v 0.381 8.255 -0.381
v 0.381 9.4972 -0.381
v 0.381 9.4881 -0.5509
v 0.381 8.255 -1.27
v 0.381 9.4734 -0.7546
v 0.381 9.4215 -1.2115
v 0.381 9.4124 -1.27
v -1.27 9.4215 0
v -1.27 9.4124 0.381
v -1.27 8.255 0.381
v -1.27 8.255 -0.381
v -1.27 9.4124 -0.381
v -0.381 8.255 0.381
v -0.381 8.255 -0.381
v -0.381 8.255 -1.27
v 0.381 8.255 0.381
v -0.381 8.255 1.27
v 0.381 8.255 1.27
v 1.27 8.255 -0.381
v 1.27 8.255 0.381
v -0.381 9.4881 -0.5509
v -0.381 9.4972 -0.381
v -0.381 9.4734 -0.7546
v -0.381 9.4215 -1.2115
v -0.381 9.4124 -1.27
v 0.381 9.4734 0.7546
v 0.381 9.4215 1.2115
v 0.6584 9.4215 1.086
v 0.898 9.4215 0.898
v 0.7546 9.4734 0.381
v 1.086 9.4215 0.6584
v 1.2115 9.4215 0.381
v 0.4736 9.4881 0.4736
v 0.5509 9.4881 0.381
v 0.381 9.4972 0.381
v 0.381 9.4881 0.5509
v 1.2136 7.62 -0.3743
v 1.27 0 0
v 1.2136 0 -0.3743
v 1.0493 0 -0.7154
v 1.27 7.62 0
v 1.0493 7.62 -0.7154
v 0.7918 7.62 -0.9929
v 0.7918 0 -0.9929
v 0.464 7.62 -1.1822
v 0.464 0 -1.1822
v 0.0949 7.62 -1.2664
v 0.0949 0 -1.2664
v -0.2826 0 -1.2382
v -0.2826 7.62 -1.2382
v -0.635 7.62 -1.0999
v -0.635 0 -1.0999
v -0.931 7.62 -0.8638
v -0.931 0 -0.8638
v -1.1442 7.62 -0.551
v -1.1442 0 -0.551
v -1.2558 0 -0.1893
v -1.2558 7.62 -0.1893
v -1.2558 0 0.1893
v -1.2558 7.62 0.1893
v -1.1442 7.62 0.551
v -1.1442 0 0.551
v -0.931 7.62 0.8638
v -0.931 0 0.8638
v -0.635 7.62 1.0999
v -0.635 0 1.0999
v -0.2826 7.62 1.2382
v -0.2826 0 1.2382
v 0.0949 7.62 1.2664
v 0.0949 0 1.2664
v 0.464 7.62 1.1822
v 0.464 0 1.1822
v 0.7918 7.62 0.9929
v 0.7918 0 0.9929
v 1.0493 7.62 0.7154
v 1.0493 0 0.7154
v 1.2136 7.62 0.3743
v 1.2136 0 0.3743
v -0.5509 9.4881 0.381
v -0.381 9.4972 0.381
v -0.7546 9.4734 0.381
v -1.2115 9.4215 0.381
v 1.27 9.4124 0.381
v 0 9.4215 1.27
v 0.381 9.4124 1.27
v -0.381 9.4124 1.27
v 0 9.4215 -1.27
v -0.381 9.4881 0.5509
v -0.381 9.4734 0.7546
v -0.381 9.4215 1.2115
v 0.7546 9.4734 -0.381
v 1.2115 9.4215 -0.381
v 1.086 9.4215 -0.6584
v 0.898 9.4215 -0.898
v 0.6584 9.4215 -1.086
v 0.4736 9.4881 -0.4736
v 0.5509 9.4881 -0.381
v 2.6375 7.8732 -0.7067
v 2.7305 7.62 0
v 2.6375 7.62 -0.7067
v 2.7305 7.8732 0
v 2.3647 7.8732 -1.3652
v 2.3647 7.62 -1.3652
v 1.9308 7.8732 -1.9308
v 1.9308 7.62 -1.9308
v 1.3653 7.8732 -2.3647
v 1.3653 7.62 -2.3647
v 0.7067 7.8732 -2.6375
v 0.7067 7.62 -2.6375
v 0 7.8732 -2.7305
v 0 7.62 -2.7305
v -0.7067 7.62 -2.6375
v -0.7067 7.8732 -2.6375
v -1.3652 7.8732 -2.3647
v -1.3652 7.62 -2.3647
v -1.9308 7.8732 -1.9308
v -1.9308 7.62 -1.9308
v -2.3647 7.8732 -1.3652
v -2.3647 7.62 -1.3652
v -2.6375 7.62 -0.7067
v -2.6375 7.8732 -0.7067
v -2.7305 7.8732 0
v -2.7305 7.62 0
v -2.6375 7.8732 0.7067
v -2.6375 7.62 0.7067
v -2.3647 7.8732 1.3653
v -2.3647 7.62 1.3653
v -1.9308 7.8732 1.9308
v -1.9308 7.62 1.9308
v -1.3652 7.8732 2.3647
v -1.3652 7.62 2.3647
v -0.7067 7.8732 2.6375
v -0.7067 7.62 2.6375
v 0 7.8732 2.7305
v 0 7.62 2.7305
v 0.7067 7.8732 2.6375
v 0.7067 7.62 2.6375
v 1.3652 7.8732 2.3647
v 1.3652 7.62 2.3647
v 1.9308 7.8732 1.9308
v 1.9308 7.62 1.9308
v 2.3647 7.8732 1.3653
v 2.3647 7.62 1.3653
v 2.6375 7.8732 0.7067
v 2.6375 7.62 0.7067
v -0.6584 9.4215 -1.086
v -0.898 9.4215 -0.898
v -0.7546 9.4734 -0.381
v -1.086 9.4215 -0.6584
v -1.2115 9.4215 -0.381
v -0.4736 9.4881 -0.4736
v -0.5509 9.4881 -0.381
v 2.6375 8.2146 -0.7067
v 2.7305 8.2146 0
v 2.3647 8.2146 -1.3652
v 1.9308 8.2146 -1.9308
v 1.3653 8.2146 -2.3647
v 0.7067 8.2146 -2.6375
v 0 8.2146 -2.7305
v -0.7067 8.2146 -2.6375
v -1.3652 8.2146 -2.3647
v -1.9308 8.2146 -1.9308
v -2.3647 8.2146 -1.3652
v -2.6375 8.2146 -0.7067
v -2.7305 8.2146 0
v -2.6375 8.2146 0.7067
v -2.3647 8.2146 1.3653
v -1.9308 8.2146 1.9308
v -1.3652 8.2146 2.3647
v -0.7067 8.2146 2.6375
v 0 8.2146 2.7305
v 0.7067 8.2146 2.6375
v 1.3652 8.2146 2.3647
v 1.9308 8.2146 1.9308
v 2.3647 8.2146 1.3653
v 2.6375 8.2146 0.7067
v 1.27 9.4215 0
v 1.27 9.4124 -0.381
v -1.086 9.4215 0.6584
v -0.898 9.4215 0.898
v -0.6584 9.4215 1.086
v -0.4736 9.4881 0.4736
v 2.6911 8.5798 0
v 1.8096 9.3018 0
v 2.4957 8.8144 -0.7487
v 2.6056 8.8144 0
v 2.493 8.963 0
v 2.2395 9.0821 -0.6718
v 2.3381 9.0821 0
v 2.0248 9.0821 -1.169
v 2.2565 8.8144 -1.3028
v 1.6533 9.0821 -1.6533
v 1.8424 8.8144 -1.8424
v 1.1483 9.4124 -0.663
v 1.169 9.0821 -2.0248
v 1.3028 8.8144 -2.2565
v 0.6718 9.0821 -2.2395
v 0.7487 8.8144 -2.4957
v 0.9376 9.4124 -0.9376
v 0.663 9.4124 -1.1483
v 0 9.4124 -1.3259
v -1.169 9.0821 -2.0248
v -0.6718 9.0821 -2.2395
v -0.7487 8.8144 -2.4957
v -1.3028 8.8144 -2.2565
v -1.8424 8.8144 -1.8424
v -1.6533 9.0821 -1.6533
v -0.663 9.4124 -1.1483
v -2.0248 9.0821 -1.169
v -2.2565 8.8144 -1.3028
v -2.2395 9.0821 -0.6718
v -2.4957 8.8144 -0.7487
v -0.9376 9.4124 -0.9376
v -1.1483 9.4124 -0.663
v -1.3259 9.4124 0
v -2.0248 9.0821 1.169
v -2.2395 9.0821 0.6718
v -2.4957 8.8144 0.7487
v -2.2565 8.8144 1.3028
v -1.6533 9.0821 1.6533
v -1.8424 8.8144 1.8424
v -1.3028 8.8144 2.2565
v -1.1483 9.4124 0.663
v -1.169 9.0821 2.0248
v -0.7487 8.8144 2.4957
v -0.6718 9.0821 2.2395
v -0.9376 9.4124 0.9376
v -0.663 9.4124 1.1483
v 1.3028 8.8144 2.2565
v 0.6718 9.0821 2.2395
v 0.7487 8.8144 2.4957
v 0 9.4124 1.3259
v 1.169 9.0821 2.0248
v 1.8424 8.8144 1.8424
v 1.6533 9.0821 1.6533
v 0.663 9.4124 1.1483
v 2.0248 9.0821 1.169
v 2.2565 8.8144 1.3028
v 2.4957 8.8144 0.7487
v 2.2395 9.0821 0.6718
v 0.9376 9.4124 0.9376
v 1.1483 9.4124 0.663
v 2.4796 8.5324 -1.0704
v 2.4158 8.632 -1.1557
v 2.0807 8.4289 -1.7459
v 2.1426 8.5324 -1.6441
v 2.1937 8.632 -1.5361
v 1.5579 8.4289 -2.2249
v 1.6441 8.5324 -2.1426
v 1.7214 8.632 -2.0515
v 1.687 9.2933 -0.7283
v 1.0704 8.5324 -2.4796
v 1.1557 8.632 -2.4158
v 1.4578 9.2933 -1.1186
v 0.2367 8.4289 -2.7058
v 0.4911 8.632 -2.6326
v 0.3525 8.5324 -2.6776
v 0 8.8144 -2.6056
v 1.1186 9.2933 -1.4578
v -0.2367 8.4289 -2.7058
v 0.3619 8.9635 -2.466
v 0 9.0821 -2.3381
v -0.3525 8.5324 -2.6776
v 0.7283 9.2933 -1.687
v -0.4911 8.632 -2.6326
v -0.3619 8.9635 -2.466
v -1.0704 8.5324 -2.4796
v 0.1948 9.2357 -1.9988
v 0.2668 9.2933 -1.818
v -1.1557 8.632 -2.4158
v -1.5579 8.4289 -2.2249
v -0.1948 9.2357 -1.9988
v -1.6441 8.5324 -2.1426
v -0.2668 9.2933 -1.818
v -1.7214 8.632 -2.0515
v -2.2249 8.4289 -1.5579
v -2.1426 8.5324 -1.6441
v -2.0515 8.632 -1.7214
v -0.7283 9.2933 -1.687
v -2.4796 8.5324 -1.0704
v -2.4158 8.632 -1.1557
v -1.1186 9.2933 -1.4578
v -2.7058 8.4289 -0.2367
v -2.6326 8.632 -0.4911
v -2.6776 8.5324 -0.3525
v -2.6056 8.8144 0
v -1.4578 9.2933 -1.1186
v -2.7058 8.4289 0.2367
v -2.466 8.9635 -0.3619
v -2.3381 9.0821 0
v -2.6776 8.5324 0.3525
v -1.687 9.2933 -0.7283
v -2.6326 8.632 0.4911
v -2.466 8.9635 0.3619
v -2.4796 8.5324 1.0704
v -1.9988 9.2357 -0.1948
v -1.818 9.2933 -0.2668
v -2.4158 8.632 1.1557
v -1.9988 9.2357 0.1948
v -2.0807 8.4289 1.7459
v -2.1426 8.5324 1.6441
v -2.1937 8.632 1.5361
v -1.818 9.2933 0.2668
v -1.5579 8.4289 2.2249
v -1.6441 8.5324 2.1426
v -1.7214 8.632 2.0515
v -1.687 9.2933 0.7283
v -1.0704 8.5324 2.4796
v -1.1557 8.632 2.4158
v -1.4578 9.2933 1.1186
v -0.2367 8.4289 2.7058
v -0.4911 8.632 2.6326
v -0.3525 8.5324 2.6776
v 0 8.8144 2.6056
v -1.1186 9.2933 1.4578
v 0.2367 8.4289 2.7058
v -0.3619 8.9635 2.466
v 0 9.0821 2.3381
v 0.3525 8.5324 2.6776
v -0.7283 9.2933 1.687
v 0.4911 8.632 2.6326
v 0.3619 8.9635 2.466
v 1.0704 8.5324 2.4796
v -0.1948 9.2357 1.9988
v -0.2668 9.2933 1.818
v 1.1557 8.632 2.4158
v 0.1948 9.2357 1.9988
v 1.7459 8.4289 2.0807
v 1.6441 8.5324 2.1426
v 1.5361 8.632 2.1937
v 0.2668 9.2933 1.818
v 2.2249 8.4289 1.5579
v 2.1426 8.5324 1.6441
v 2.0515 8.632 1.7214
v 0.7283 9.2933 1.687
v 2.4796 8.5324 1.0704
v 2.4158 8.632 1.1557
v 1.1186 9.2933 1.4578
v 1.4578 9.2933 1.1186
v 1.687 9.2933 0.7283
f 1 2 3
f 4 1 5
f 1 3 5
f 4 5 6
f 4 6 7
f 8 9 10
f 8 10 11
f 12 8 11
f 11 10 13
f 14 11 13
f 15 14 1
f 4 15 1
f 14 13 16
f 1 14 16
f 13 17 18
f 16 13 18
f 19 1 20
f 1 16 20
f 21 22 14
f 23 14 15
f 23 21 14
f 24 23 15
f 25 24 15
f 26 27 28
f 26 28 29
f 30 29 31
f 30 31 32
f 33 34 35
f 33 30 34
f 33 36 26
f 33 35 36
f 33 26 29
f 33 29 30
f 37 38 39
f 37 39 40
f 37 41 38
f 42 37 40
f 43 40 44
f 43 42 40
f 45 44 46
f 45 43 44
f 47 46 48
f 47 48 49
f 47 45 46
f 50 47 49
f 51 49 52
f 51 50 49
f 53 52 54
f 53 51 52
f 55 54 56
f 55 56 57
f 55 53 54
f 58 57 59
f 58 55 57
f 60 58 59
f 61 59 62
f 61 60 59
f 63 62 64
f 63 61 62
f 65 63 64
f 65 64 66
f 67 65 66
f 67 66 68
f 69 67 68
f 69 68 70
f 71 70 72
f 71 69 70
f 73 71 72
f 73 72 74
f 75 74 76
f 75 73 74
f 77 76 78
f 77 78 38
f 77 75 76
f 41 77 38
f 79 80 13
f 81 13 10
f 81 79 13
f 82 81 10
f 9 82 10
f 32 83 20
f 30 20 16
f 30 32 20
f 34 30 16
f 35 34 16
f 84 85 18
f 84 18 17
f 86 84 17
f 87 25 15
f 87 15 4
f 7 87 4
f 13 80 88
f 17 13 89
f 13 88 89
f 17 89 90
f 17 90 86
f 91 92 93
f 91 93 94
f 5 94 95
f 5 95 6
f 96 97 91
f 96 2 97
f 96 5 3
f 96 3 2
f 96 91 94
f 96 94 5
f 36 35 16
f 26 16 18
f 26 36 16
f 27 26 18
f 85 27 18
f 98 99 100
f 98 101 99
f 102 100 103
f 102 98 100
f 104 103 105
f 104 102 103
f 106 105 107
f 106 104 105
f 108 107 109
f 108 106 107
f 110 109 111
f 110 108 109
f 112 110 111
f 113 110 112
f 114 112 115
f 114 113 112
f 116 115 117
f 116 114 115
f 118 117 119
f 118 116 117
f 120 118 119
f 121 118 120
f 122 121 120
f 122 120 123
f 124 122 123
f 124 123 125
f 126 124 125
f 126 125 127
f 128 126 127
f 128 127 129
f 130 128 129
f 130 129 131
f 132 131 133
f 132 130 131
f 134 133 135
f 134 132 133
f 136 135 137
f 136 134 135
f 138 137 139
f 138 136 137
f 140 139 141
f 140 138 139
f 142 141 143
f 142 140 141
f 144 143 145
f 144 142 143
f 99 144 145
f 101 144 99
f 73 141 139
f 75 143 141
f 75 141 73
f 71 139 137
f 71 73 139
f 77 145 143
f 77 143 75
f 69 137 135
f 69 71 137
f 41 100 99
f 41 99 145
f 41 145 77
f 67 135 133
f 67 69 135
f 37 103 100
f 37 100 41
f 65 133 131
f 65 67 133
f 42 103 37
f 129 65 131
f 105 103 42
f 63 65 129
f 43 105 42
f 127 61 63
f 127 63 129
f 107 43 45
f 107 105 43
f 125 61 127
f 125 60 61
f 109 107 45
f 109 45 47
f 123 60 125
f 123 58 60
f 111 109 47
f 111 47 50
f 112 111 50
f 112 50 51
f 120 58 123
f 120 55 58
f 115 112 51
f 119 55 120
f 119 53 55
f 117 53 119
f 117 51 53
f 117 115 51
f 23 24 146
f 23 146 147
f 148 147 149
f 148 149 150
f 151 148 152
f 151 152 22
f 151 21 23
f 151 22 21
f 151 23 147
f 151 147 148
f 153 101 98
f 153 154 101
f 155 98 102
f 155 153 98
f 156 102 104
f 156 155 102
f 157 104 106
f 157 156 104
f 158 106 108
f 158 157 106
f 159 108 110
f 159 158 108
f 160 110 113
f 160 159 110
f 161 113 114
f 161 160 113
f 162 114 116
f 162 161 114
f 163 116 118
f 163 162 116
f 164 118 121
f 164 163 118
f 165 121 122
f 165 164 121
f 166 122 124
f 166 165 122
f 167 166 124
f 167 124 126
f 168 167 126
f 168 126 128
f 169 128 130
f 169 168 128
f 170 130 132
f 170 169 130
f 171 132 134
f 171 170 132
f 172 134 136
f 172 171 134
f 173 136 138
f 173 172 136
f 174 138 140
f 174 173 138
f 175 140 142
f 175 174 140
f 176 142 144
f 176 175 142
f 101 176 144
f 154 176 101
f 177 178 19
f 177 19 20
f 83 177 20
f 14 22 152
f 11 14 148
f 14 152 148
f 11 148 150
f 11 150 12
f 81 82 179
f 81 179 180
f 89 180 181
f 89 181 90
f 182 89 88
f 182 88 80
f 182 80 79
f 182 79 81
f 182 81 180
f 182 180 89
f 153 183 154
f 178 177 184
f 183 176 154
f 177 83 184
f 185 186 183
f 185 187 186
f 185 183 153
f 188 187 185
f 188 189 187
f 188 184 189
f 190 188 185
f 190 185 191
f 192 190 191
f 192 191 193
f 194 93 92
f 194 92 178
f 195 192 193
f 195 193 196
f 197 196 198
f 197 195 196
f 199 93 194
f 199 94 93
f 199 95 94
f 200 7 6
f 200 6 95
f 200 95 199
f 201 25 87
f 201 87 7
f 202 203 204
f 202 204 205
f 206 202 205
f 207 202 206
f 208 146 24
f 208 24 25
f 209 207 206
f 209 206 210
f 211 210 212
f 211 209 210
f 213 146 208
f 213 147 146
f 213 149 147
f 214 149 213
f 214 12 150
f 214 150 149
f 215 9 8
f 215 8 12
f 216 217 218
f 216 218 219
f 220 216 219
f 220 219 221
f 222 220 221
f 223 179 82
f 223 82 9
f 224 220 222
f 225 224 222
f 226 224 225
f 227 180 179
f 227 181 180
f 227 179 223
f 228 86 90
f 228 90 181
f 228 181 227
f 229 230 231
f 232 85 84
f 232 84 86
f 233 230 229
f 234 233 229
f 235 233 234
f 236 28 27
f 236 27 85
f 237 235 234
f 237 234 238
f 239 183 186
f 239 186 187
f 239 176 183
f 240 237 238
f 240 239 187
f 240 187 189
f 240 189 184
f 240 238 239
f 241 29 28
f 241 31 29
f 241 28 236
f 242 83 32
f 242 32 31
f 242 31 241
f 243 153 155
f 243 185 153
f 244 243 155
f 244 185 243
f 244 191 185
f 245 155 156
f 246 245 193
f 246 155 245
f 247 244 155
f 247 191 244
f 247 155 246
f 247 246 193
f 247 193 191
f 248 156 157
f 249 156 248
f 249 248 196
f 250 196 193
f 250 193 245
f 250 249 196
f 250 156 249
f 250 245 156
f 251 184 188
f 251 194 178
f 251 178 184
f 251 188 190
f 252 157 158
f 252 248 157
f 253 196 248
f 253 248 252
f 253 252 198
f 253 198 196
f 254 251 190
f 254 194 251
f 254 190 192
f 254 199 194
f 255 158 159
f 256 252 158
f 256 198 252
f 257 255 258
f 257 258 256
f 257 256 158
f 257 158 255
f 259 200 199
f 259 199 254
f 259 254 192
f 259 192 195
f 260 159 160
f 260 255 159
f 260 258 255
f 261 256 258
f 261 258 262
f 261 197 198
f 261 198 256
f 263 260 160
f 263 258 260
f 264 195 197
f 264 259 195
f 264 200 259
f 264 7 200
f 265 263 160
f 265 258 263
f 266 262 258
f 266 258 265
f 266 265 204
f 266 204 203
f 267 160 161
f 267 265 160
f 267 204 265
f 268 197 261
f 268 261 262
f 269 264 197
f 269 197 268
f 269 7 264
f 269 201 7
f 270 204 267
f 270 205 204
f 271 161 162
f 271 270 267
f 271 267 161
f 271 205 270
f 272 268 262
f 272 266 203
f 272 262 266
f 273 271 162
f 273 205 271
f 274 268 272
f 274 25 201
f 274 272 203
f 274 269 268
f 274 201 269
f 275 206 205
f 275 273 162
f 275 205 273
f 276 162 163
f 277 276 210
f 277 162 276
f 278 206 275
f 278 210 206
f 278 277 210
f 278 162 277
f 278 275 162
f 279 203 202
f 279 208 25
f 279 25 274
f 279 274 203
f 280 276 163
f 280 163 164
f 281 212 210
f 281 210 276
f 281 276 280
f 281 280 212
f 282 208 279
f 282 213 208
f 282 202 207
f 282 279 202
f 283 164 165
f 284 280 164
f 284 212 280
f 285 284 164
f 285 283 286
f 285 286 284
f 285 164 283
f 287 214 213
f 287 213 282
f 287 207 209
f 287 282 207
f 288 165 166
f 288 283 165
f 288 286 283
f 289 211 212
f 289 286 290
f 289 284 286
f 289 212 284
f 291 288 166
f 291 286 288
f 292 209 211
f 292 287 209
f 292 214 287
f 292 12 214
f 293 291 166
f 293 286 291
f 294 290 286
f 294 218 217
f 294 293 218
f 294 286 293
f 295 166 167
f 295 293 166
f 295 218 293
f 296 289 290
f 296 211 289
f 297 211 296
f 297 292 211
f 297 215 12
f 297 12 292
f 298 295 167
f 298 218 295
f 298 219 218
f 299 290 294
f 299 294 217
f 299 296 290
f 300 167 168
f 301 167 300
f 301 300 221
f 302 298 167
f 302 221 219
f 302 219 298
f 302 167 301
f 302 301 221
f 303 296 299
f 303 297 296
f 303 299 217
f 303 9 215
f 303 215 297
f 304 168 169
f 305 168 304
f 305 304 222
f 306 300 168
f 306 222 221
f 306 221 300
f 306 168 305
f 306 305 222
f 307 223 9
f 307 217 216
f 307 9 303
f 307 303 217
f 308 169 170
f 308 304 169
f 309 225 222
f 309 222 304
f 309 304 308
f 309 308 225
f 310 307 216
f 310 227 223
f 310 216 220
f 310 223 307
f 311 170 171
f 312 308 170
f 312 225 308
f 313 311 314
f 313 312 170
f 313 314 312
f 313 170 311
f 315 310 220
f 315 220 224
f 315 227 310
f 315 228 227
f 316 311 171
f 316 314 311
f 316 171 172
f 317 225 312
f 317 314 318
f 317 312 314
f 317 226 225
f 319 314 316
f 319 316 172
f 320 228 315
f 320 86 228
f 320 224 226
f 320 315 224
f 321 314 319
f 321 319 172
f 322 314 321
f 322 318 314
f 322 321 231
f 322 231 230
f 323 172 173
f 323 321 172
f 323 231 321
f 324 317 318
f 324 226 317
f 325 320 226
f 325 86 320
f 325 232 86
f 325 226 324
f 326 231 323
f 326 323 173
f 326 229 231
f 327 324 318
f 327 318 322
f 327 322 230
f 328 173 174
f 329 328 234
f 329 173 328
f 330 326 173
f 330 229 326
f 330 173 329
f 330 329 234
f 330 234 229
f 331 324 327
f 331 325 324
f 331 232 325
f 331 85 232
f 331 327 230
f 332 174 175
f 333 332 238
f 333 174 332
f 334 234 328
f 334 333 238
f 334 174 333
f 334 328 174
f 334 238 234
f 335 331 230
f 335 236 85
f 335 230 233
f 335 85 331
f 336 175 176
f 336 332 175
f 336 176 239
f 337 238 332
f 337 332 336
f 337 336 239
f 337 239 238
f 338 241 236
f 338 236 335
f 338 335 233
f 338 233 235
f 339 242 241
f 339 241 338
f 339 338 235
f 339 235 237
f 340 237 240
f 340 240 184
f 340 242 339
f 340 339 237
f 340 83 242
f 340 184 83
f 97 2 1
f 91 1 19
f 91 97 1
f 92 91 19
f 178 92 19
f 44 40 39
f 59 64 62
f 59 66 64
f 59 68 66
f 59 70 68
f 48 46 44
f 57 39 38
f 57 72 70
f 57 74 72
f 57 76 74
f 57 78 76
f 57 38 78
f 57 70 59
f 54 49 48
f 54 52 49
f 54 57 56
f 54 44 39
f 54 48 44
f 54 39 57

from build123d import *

# Parameters (mm, degrees)
REVOLVE1_OUTLINE_W = 1.27
REVOLVE1_OUTLINE_H = 7.62
SKETCH2_W          = 1.27
SKETCH2_H          = 0.762
CUT_EXTRUDE1_DEPTH = 1.27
CIRPATTERN1_COUNT  = 4


# Read off the part's stored shape, not the designer's step: Revolve1
with BuildPart() as part:
    # Revolve1 outline → Revolve1 (revolve)
    with BuildSketch(Plane.XY):
        with Locations((0.635, 3.81)):
            Rectangle(REVOLVE1_OUTLINE_W, REVOLVE1_OUTLINE_H)
        with BuildLine():
            Line((0, 9.525), (0, 7.62))
            Line((0, 7.62), (1.27, 7.62))
            Line((1.27, 7.62), (1.27, 9.421457579))
            add(Edge.make_bspline(
                [(1.27, 9.421457579), (1.228139819, 9.428026655), (0.811912502, 9.488262021), (0.384414806, 9.507605733), (0, 9.525)],
                knots=[0.678395856, 0.678395856, 0.678395856, 0.678395856, 0.710806875, 1, 1, 1, 1], degree=3))
        make_face()
        with BuildLine():
            Line((1.27, 9.421457579), (1.27, 7.62))
            Line((1.27, 7.62), (2.7305, 7.62))
            add(Edge.make_bspline(
                [(2.7305, 7.62), (2.730181564, 7.703312624), (2.729863127, 7.786625248), (2.7305, 7.873222802)],
                knots=[0, 0, 0, 0, 0.063828226, 0.063828226, 0.063828226, 0.063828226], degree=3))
            Line((2.7305, 7.873222802), (2.7305, 8.214607098))
            add(Edge.make_bspline(
                [(2.7305, 8.214607098), (2.72332571, 8.473946678), (2.657632203, 8.947113323), (1.963979921, 9.279802566), (1.518244272, 9.38250086), (1.27, 9.421457579)],
                knots=[0.145285385, 0.145285385, 0.145285385, 0.145285385, 0.328975575, 0.486188137, 0.678395856, 0.678395856, 0.678395856, 0.678395856], degree=3))
        make_face()
        with BuildLine():
            Line((2.7305, 8.214607098), (2.7305, 7.873222802))
            add(Edge.make_bspline(
                [(2.7305, 7.873222802), (2.731005418, 7.941946006), (2.73211248, 8.012738026), (2.73211248, 8.084105221)],
                knots=[0.063828226, 0.063828226, 0.063828226, 0.063828226, 0.114481853, 0.114481853, 0.114481853, 0.114481853], degree=3))
            add(Edge.make_bspline(
                [(2.73211248, 8.084105221), (2.73211248, 8.127505109), (2.731703077, 8.171117703), (2.7305, 8.214607098)],
                knots=[0.114481853, 0.114481853, 0.114481853, 0.114481853, 0.145285385, 0.145285385, 0.145285385, 0.145285385], degree=3))
        make_face()
    revolve(axis=Axis((0, 0, 0), (0, 1, 0)))

    # Sketch2 → Cut-Extrude1 (cut)
    with BuildSketch(Plane.XZ.offset(-9.525)):
        with Locations((0.635, 0)):
            Rectangle(SKETCH2_W, SKETCH2_H)
    cut_extrude1 = extrude(amount=CUT_EXTRUDE1_DEPTH, mode=Mode.SUBTRACT)

    # CirPattern1: Cut-Extrude1 ×4 about axis
    cirpattern1_axis = Axis((0, 0, 0), (0, 1, 0))
    for i in range(1, CIRPATTERN1_COUNT):
        add(cut_extrude1.rotate(cirpattern1_axis, i * 360 / CIRPATTERN1_COUNT), mode=Mode.SUBTRACT)


solid = part.part
